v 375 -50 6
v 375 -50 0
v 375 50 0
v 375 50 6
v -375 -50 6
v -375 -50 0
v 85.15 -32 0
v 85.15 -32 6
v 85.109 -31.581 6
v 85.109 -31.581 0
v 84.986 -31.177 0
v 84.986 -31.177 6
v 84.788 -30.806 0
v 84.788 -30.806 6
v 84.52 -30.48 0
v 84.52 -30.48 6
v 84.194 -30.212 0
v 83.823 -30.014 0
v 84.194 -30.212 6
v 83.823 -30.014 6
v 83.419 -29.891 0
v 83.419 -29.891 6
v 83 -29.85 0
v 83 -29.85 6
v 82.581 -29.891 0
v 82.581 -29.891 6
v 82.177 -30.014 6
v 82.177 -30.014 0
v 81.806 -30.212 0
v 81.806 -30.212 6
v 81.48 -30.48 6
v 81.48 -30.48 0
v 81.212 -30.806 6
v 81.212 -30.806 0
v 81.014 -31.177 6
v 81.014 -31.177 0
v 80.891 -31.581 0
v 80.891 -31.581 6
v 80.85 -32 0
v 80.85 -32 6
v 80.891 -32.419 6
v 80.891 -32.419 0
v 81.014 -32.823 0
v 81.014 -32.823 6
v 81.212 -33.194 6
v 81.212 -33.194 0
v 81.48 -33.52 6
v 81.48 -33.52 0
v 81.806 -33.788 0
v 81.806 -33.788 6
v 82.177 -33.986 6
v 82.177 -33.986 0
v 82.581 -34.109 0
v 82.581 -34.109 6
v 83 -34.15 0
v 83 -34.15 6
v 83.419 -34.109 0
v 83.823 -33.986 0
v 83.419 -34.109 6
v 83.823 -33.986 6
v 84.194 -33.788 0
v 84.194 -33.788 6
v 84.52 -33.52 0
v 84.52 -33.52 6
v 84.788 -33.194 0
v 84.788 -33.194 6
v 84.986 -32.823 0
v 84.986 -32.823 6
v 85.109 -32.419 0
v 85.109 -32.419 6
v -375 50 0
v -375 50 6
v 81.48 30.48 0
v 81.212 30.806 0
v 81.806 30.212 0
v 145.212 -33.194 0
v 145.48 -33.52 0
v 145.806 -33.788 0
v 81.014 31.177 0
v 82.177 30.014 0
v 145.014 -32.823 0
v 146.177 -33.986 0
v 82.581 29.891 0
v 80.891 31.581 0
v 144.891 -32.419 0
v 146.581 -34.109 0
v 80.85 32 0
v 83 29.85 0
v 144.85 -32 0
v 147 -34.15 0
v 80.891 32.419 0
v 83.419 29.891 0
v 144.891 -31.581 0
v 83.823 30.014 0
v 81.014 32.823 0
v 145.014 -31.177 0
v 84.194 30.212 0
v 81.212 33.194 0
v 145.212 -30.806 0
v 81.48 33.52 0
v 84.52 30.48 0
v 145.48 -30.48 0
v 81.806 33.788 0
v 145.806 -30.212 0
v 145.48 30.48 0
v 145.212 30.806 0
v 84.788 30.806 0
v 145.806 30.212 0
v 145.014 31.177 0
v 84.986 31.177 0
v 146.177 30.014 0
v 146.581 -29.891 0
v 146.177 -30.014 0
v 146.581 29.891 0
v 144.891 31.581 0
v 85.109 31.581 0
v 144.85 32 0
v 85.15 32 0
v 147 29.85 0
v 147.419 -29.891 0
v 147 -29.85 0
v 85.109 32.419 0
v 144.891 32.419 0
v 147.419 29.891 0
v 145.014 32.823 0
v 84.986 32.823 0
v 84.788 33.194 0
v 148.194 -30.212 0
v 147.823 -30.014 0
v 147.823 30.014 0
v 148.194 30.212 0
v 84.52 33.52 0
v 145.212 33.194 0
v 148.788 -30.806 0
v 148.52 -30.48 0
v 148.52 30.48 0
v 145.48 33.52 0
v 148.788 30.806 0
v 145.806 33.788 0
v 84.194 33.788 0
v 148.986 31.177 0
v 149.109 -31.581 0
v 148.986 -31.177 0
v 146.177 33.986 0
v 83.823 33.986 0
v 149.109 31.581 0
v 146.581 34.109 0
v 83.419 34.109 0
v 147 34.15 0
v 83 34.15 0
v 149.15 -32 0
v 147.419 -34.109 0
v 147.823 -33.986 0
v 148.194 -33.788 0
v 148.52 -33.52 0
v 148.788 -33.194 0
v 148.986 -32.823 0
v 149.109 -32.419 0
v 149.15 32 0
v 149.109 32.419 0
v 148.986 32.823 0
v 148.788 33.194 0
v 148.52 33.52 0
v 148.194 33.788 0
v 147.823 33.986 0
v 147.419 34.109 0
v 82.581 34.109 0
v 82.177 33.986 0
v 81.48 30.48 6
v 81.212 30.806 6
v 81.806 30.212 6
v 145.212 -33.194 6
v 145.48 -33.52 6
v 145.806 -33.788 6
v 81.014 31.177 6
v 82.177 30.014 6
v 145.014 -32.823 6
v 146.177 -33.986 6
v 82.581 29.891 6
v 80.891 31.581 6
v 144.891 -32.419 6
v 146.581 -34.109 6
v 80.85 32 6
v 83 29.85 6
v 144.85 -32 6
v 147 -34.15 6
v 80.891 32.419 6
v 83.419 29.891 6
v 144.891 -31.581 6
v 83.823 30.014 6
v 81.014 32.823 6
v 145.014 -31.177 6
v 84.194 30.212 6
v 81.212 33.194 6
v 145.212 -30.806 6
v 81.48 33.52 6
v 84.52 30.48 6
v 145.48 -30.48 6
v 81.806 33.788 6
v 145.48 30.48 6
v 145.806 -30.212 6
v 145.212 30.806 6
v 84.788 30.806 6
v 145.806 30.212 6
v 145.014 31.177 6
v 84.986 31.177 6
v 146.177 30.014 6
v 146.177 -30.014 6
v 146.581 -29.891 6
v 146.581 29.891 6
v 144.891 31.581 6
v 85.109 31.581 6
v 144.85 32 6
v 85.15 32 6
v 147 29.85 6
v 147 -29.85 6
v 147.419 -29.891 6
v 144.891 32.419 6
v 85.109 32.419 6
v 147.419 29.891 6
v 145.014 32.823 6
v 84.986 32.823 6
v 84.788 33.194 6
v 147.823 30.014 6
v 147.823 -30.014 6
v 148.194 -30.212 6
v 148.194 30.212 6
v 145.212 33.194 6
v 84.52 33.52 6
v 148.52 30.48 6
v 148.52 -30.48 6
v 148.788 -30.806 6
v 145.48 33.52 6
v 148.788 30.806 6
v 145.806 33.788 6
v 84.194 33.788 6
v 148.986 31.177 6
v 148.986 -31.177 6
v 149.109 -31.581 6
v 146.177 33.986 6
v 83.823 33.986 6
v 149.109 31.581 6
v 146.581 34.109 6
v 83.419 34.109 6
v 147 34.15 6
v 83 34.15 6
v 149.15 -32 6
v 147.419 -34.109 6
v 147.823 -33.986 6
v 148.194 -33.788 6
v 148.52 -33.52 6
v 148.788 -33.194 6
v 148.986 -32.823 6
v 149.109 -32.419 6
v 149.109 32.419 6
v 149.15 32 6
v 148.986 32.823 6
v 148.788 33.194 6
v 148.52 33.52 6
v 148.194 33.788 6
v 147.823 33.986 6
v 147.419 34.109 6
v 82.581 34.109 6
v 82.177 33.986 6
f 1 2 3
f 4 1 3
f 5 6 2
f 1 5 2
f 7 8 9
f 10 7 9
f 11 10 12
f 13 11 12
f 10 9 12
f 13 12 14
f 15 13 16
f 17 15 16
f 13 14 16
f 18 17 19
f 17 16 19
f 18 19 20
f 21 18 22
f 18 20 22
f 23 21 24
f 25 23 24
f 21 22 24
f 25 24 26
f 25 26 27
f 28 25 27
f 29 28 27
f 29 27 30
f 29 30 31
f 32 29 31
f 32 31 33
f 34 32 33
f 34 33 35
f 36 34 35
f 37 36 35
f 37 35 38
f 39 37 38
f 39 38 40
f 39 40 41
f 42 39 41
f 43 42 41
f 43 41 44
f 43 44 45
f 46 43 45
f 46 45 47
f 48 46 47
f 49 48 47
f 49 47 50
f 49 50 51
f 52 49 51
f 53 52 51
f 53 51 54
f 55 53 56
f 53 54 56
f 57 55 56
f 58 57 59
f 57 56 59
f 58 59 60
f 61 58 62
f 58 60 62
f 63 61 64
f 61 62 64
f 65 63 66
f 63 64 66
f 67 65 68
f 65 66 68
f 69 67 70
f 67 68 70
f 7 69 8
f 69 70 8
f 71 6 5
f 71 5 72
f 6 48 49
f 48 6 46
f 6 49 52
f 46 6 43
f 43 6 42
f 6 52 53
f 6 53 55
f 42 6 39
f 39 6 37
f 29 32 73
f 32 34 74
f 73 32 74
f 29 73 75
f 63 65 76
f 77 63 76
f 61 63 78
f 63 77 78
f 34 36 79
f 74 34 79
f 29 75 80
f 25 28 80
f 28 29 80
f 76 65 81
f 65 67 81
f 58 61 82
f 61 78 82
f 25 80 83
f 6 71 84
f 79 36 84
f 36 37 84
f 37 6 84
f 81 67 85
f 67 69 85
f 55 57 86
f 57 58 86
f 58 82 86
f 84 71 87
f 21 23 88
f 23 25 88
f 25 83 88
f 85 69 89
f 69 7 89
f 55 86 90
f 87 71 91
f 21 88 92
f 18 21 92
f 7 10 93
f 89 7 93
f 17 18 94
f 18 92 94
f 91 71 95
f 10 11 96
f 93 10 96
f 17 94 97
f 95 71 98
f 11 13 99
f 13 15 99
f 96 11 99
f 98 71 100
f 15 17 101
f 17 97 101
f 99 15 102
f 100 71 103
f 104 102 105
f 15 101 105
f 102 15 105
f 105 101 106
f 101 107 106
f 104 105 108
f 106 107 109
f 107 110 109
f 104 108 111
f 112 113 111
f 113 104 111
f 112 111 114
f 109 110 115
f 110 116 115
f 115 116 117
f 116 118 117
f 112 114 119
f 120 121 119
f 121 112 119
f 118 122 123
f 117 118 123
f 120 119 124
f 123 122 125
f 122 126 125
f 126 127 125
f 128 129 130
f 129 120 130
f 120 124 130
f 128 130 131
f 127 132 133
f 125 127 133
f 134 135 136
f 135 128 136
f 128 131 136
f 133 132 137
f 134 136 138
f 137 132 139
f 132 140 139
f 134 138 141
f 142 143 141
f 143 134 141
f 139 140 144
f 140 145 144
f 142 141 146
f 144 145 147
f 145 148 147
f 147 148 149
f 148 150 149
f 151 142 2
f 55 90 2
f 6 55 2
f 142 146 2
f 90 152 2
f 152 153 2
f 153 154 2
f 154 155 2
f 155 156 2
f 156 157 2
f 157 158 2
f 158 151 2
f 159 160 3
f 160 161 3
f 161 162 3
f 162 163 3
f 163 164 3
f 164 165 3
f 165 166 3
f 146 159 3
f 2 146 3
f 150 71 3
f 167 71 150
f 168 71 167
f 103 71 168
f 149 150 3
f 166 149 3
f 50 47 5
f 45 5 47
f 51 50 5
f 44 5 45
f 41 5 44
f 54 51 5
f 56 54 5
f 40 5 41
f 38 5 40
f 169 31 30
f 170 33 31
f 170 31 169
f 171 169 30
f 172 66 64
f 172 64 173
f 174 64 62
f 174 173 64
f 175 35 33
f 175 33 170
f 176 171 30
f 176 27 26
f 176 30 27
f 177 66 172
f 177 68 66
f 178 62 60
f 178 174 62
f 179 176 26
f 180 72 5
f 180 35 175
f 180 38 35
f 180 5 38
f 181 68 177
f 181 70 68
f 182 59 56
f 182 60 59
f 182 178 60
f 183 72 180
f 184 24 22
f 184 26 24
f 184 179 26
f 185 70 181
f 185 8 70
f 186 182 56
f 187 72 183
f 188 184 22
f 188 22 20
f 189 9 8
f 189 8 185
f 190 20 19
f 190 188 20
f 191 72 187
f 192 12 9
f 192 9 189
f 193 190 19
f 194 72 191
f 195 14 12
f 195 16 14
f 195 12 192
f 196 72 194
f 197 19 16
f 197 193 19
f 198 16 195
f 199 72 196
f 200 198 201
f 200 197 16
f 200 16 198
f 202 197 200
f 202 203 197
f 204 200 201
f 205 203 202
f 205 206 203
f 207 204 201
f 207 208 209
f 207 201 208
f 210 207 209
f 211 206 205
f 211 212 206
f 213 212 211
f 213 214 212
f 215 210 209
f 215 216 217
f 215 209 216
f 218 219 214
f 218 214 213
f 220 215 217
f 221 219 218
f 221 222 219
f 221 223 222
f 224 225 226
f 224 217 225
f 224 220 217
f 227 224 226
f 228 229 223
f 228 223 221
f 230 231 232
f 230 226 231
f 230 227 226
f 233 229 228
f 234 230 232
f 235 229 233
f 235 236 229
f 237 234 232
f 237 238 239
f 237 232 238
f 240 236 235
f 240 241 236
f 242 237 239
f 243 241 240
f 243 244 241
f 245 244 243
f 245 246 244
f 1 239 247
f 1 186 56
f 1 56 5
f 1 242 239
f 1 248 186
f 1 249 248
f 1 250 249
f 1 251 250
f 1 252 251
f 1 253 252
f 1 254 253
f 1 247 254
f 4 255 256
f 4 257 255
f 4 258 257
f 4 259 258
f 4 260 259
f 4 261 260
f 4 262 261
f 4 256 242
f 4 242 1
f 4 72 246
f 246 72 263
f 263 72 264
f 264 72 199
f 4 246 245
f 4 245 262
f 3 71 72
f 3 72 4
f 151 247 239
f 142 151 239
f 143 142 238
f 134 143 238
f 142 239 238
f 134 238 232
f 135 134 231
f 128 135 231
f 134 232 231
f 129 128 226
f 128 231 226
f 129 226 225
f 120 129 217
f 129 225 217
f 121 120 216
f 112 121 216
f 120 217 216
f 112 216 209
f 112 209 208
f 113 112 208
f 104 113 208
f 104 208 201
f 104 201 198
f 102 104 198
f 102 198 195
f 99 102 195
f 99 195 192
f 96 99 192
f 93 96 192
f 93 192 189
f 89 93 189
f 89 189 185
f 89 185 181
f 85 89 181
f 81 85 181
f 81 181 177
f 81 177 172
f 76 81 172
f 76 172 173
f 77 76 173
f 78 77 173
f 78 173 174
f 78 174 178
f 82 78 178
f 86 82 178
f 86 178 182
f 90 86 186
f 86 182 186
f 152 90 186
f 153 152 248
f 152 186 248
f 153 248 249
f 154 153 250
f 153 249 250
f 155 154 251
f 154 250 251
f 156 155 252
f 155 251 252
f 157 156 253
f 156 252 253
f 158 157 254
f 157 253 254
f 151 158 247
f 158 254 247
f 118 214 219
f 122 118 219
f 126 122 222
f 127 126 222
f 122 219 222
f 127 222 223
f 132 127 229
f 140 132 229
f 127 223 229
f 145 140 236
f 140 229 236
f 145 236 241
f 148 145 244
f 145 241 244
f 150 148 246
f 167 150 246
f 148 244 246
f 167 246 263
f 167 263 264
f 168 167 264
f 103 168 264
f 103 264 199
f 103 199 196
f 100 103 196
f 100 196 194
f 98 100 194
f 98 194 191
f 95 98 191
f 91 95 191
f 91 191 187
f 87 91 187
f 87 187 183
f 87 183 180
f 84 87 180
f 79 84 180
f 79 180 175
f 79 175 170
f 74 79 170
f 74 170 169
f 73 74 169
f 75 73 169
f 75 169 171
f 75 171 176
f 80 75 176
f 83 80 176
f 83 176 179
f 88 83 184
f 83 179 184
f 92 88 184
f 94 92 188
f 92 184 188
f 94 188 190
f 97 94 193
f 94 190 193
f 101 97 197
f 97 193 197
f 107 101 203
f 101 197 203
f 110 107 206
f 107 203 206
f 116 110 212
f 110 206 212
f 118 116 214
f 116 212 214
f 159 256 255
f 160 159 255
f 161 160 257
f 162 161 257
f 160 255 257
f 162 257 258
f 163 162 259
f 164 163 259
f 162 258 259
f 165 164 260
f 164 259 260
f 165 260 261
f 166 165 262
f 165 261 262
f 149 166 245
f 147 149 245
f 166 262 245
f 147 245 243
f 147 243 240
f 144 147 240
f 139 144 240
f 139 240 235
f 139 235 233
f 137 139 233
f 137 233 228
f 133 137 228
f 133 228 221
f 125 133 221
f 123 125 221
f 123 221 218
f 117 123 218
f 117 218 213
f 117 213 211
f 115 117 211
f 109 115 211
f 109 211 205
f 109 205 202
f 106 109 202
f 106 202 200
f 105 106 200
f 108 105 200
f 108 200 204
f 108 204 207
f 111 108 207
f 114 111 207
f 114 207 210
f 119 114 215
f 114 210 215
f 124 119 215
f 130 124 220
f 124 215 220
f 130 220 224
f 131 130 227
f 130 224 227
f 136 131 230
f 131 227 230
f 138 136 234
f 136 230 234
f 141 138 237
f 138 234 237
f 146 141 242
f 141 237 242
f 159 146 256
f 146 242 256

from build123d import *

# Parameters (mm, degrees)
ESQUISSE1_W                     = 750
ESQUISSE1_H                     = 100
BOSS_EXTRU_1_DEPTH              = 6
D_GAGEMENT_M43_D                = 4.3
R_P_TITION_LIN_AIRE1_COUNT      = 2
R_P_TITION_LIN_AIRE1_PITCH      = 64
R_P_TITION_LIN_AIRE1_COUNT_DIR2 = 2
R_P_TITION_LIN_AIRE1_PITCH_DIR2 = 64


with BuildPart() as part:
    # Esquisse1 → Boss.-Extru.1 (new body)
    with BuildSketch(Plane.XY):
        Rectangle(ESQUISSE1_W, ESQUISSE1_H)
    extrude(amount=BOSS_EXTRU_1_DEPTH)

    # Dégagement M43 (through all)
    with Locations(Plane(origin=(111.028323747, 8.062718608, -3), x_dir=(-1, 0, 0), z_dir=(0, 0, -1))):
        with Locations((28.028323747, -40.06271861)):
            d_gagement_m43 = Hole(D_GAGEMENT_M43_D / 2)

    # Répétition linéaire1: D_gagement M43 2 × 2
    with Locations(*[(i * R_P_TITION_LIN_AIRE1_PITCH, j * R_P_TITION_LIN_AIRE1_PITCH_DIR2, 0) for i in range(R_P_TITION_LIN_AIRE1_COUNT) for j in range(R_P_TITION_LIN_AIRE1_COUNT_DIR2) if (i, j) != (0, 0)]):
        add(d_gagement_m43, mode=Mode.SUBTRACT)


solid = part.part
